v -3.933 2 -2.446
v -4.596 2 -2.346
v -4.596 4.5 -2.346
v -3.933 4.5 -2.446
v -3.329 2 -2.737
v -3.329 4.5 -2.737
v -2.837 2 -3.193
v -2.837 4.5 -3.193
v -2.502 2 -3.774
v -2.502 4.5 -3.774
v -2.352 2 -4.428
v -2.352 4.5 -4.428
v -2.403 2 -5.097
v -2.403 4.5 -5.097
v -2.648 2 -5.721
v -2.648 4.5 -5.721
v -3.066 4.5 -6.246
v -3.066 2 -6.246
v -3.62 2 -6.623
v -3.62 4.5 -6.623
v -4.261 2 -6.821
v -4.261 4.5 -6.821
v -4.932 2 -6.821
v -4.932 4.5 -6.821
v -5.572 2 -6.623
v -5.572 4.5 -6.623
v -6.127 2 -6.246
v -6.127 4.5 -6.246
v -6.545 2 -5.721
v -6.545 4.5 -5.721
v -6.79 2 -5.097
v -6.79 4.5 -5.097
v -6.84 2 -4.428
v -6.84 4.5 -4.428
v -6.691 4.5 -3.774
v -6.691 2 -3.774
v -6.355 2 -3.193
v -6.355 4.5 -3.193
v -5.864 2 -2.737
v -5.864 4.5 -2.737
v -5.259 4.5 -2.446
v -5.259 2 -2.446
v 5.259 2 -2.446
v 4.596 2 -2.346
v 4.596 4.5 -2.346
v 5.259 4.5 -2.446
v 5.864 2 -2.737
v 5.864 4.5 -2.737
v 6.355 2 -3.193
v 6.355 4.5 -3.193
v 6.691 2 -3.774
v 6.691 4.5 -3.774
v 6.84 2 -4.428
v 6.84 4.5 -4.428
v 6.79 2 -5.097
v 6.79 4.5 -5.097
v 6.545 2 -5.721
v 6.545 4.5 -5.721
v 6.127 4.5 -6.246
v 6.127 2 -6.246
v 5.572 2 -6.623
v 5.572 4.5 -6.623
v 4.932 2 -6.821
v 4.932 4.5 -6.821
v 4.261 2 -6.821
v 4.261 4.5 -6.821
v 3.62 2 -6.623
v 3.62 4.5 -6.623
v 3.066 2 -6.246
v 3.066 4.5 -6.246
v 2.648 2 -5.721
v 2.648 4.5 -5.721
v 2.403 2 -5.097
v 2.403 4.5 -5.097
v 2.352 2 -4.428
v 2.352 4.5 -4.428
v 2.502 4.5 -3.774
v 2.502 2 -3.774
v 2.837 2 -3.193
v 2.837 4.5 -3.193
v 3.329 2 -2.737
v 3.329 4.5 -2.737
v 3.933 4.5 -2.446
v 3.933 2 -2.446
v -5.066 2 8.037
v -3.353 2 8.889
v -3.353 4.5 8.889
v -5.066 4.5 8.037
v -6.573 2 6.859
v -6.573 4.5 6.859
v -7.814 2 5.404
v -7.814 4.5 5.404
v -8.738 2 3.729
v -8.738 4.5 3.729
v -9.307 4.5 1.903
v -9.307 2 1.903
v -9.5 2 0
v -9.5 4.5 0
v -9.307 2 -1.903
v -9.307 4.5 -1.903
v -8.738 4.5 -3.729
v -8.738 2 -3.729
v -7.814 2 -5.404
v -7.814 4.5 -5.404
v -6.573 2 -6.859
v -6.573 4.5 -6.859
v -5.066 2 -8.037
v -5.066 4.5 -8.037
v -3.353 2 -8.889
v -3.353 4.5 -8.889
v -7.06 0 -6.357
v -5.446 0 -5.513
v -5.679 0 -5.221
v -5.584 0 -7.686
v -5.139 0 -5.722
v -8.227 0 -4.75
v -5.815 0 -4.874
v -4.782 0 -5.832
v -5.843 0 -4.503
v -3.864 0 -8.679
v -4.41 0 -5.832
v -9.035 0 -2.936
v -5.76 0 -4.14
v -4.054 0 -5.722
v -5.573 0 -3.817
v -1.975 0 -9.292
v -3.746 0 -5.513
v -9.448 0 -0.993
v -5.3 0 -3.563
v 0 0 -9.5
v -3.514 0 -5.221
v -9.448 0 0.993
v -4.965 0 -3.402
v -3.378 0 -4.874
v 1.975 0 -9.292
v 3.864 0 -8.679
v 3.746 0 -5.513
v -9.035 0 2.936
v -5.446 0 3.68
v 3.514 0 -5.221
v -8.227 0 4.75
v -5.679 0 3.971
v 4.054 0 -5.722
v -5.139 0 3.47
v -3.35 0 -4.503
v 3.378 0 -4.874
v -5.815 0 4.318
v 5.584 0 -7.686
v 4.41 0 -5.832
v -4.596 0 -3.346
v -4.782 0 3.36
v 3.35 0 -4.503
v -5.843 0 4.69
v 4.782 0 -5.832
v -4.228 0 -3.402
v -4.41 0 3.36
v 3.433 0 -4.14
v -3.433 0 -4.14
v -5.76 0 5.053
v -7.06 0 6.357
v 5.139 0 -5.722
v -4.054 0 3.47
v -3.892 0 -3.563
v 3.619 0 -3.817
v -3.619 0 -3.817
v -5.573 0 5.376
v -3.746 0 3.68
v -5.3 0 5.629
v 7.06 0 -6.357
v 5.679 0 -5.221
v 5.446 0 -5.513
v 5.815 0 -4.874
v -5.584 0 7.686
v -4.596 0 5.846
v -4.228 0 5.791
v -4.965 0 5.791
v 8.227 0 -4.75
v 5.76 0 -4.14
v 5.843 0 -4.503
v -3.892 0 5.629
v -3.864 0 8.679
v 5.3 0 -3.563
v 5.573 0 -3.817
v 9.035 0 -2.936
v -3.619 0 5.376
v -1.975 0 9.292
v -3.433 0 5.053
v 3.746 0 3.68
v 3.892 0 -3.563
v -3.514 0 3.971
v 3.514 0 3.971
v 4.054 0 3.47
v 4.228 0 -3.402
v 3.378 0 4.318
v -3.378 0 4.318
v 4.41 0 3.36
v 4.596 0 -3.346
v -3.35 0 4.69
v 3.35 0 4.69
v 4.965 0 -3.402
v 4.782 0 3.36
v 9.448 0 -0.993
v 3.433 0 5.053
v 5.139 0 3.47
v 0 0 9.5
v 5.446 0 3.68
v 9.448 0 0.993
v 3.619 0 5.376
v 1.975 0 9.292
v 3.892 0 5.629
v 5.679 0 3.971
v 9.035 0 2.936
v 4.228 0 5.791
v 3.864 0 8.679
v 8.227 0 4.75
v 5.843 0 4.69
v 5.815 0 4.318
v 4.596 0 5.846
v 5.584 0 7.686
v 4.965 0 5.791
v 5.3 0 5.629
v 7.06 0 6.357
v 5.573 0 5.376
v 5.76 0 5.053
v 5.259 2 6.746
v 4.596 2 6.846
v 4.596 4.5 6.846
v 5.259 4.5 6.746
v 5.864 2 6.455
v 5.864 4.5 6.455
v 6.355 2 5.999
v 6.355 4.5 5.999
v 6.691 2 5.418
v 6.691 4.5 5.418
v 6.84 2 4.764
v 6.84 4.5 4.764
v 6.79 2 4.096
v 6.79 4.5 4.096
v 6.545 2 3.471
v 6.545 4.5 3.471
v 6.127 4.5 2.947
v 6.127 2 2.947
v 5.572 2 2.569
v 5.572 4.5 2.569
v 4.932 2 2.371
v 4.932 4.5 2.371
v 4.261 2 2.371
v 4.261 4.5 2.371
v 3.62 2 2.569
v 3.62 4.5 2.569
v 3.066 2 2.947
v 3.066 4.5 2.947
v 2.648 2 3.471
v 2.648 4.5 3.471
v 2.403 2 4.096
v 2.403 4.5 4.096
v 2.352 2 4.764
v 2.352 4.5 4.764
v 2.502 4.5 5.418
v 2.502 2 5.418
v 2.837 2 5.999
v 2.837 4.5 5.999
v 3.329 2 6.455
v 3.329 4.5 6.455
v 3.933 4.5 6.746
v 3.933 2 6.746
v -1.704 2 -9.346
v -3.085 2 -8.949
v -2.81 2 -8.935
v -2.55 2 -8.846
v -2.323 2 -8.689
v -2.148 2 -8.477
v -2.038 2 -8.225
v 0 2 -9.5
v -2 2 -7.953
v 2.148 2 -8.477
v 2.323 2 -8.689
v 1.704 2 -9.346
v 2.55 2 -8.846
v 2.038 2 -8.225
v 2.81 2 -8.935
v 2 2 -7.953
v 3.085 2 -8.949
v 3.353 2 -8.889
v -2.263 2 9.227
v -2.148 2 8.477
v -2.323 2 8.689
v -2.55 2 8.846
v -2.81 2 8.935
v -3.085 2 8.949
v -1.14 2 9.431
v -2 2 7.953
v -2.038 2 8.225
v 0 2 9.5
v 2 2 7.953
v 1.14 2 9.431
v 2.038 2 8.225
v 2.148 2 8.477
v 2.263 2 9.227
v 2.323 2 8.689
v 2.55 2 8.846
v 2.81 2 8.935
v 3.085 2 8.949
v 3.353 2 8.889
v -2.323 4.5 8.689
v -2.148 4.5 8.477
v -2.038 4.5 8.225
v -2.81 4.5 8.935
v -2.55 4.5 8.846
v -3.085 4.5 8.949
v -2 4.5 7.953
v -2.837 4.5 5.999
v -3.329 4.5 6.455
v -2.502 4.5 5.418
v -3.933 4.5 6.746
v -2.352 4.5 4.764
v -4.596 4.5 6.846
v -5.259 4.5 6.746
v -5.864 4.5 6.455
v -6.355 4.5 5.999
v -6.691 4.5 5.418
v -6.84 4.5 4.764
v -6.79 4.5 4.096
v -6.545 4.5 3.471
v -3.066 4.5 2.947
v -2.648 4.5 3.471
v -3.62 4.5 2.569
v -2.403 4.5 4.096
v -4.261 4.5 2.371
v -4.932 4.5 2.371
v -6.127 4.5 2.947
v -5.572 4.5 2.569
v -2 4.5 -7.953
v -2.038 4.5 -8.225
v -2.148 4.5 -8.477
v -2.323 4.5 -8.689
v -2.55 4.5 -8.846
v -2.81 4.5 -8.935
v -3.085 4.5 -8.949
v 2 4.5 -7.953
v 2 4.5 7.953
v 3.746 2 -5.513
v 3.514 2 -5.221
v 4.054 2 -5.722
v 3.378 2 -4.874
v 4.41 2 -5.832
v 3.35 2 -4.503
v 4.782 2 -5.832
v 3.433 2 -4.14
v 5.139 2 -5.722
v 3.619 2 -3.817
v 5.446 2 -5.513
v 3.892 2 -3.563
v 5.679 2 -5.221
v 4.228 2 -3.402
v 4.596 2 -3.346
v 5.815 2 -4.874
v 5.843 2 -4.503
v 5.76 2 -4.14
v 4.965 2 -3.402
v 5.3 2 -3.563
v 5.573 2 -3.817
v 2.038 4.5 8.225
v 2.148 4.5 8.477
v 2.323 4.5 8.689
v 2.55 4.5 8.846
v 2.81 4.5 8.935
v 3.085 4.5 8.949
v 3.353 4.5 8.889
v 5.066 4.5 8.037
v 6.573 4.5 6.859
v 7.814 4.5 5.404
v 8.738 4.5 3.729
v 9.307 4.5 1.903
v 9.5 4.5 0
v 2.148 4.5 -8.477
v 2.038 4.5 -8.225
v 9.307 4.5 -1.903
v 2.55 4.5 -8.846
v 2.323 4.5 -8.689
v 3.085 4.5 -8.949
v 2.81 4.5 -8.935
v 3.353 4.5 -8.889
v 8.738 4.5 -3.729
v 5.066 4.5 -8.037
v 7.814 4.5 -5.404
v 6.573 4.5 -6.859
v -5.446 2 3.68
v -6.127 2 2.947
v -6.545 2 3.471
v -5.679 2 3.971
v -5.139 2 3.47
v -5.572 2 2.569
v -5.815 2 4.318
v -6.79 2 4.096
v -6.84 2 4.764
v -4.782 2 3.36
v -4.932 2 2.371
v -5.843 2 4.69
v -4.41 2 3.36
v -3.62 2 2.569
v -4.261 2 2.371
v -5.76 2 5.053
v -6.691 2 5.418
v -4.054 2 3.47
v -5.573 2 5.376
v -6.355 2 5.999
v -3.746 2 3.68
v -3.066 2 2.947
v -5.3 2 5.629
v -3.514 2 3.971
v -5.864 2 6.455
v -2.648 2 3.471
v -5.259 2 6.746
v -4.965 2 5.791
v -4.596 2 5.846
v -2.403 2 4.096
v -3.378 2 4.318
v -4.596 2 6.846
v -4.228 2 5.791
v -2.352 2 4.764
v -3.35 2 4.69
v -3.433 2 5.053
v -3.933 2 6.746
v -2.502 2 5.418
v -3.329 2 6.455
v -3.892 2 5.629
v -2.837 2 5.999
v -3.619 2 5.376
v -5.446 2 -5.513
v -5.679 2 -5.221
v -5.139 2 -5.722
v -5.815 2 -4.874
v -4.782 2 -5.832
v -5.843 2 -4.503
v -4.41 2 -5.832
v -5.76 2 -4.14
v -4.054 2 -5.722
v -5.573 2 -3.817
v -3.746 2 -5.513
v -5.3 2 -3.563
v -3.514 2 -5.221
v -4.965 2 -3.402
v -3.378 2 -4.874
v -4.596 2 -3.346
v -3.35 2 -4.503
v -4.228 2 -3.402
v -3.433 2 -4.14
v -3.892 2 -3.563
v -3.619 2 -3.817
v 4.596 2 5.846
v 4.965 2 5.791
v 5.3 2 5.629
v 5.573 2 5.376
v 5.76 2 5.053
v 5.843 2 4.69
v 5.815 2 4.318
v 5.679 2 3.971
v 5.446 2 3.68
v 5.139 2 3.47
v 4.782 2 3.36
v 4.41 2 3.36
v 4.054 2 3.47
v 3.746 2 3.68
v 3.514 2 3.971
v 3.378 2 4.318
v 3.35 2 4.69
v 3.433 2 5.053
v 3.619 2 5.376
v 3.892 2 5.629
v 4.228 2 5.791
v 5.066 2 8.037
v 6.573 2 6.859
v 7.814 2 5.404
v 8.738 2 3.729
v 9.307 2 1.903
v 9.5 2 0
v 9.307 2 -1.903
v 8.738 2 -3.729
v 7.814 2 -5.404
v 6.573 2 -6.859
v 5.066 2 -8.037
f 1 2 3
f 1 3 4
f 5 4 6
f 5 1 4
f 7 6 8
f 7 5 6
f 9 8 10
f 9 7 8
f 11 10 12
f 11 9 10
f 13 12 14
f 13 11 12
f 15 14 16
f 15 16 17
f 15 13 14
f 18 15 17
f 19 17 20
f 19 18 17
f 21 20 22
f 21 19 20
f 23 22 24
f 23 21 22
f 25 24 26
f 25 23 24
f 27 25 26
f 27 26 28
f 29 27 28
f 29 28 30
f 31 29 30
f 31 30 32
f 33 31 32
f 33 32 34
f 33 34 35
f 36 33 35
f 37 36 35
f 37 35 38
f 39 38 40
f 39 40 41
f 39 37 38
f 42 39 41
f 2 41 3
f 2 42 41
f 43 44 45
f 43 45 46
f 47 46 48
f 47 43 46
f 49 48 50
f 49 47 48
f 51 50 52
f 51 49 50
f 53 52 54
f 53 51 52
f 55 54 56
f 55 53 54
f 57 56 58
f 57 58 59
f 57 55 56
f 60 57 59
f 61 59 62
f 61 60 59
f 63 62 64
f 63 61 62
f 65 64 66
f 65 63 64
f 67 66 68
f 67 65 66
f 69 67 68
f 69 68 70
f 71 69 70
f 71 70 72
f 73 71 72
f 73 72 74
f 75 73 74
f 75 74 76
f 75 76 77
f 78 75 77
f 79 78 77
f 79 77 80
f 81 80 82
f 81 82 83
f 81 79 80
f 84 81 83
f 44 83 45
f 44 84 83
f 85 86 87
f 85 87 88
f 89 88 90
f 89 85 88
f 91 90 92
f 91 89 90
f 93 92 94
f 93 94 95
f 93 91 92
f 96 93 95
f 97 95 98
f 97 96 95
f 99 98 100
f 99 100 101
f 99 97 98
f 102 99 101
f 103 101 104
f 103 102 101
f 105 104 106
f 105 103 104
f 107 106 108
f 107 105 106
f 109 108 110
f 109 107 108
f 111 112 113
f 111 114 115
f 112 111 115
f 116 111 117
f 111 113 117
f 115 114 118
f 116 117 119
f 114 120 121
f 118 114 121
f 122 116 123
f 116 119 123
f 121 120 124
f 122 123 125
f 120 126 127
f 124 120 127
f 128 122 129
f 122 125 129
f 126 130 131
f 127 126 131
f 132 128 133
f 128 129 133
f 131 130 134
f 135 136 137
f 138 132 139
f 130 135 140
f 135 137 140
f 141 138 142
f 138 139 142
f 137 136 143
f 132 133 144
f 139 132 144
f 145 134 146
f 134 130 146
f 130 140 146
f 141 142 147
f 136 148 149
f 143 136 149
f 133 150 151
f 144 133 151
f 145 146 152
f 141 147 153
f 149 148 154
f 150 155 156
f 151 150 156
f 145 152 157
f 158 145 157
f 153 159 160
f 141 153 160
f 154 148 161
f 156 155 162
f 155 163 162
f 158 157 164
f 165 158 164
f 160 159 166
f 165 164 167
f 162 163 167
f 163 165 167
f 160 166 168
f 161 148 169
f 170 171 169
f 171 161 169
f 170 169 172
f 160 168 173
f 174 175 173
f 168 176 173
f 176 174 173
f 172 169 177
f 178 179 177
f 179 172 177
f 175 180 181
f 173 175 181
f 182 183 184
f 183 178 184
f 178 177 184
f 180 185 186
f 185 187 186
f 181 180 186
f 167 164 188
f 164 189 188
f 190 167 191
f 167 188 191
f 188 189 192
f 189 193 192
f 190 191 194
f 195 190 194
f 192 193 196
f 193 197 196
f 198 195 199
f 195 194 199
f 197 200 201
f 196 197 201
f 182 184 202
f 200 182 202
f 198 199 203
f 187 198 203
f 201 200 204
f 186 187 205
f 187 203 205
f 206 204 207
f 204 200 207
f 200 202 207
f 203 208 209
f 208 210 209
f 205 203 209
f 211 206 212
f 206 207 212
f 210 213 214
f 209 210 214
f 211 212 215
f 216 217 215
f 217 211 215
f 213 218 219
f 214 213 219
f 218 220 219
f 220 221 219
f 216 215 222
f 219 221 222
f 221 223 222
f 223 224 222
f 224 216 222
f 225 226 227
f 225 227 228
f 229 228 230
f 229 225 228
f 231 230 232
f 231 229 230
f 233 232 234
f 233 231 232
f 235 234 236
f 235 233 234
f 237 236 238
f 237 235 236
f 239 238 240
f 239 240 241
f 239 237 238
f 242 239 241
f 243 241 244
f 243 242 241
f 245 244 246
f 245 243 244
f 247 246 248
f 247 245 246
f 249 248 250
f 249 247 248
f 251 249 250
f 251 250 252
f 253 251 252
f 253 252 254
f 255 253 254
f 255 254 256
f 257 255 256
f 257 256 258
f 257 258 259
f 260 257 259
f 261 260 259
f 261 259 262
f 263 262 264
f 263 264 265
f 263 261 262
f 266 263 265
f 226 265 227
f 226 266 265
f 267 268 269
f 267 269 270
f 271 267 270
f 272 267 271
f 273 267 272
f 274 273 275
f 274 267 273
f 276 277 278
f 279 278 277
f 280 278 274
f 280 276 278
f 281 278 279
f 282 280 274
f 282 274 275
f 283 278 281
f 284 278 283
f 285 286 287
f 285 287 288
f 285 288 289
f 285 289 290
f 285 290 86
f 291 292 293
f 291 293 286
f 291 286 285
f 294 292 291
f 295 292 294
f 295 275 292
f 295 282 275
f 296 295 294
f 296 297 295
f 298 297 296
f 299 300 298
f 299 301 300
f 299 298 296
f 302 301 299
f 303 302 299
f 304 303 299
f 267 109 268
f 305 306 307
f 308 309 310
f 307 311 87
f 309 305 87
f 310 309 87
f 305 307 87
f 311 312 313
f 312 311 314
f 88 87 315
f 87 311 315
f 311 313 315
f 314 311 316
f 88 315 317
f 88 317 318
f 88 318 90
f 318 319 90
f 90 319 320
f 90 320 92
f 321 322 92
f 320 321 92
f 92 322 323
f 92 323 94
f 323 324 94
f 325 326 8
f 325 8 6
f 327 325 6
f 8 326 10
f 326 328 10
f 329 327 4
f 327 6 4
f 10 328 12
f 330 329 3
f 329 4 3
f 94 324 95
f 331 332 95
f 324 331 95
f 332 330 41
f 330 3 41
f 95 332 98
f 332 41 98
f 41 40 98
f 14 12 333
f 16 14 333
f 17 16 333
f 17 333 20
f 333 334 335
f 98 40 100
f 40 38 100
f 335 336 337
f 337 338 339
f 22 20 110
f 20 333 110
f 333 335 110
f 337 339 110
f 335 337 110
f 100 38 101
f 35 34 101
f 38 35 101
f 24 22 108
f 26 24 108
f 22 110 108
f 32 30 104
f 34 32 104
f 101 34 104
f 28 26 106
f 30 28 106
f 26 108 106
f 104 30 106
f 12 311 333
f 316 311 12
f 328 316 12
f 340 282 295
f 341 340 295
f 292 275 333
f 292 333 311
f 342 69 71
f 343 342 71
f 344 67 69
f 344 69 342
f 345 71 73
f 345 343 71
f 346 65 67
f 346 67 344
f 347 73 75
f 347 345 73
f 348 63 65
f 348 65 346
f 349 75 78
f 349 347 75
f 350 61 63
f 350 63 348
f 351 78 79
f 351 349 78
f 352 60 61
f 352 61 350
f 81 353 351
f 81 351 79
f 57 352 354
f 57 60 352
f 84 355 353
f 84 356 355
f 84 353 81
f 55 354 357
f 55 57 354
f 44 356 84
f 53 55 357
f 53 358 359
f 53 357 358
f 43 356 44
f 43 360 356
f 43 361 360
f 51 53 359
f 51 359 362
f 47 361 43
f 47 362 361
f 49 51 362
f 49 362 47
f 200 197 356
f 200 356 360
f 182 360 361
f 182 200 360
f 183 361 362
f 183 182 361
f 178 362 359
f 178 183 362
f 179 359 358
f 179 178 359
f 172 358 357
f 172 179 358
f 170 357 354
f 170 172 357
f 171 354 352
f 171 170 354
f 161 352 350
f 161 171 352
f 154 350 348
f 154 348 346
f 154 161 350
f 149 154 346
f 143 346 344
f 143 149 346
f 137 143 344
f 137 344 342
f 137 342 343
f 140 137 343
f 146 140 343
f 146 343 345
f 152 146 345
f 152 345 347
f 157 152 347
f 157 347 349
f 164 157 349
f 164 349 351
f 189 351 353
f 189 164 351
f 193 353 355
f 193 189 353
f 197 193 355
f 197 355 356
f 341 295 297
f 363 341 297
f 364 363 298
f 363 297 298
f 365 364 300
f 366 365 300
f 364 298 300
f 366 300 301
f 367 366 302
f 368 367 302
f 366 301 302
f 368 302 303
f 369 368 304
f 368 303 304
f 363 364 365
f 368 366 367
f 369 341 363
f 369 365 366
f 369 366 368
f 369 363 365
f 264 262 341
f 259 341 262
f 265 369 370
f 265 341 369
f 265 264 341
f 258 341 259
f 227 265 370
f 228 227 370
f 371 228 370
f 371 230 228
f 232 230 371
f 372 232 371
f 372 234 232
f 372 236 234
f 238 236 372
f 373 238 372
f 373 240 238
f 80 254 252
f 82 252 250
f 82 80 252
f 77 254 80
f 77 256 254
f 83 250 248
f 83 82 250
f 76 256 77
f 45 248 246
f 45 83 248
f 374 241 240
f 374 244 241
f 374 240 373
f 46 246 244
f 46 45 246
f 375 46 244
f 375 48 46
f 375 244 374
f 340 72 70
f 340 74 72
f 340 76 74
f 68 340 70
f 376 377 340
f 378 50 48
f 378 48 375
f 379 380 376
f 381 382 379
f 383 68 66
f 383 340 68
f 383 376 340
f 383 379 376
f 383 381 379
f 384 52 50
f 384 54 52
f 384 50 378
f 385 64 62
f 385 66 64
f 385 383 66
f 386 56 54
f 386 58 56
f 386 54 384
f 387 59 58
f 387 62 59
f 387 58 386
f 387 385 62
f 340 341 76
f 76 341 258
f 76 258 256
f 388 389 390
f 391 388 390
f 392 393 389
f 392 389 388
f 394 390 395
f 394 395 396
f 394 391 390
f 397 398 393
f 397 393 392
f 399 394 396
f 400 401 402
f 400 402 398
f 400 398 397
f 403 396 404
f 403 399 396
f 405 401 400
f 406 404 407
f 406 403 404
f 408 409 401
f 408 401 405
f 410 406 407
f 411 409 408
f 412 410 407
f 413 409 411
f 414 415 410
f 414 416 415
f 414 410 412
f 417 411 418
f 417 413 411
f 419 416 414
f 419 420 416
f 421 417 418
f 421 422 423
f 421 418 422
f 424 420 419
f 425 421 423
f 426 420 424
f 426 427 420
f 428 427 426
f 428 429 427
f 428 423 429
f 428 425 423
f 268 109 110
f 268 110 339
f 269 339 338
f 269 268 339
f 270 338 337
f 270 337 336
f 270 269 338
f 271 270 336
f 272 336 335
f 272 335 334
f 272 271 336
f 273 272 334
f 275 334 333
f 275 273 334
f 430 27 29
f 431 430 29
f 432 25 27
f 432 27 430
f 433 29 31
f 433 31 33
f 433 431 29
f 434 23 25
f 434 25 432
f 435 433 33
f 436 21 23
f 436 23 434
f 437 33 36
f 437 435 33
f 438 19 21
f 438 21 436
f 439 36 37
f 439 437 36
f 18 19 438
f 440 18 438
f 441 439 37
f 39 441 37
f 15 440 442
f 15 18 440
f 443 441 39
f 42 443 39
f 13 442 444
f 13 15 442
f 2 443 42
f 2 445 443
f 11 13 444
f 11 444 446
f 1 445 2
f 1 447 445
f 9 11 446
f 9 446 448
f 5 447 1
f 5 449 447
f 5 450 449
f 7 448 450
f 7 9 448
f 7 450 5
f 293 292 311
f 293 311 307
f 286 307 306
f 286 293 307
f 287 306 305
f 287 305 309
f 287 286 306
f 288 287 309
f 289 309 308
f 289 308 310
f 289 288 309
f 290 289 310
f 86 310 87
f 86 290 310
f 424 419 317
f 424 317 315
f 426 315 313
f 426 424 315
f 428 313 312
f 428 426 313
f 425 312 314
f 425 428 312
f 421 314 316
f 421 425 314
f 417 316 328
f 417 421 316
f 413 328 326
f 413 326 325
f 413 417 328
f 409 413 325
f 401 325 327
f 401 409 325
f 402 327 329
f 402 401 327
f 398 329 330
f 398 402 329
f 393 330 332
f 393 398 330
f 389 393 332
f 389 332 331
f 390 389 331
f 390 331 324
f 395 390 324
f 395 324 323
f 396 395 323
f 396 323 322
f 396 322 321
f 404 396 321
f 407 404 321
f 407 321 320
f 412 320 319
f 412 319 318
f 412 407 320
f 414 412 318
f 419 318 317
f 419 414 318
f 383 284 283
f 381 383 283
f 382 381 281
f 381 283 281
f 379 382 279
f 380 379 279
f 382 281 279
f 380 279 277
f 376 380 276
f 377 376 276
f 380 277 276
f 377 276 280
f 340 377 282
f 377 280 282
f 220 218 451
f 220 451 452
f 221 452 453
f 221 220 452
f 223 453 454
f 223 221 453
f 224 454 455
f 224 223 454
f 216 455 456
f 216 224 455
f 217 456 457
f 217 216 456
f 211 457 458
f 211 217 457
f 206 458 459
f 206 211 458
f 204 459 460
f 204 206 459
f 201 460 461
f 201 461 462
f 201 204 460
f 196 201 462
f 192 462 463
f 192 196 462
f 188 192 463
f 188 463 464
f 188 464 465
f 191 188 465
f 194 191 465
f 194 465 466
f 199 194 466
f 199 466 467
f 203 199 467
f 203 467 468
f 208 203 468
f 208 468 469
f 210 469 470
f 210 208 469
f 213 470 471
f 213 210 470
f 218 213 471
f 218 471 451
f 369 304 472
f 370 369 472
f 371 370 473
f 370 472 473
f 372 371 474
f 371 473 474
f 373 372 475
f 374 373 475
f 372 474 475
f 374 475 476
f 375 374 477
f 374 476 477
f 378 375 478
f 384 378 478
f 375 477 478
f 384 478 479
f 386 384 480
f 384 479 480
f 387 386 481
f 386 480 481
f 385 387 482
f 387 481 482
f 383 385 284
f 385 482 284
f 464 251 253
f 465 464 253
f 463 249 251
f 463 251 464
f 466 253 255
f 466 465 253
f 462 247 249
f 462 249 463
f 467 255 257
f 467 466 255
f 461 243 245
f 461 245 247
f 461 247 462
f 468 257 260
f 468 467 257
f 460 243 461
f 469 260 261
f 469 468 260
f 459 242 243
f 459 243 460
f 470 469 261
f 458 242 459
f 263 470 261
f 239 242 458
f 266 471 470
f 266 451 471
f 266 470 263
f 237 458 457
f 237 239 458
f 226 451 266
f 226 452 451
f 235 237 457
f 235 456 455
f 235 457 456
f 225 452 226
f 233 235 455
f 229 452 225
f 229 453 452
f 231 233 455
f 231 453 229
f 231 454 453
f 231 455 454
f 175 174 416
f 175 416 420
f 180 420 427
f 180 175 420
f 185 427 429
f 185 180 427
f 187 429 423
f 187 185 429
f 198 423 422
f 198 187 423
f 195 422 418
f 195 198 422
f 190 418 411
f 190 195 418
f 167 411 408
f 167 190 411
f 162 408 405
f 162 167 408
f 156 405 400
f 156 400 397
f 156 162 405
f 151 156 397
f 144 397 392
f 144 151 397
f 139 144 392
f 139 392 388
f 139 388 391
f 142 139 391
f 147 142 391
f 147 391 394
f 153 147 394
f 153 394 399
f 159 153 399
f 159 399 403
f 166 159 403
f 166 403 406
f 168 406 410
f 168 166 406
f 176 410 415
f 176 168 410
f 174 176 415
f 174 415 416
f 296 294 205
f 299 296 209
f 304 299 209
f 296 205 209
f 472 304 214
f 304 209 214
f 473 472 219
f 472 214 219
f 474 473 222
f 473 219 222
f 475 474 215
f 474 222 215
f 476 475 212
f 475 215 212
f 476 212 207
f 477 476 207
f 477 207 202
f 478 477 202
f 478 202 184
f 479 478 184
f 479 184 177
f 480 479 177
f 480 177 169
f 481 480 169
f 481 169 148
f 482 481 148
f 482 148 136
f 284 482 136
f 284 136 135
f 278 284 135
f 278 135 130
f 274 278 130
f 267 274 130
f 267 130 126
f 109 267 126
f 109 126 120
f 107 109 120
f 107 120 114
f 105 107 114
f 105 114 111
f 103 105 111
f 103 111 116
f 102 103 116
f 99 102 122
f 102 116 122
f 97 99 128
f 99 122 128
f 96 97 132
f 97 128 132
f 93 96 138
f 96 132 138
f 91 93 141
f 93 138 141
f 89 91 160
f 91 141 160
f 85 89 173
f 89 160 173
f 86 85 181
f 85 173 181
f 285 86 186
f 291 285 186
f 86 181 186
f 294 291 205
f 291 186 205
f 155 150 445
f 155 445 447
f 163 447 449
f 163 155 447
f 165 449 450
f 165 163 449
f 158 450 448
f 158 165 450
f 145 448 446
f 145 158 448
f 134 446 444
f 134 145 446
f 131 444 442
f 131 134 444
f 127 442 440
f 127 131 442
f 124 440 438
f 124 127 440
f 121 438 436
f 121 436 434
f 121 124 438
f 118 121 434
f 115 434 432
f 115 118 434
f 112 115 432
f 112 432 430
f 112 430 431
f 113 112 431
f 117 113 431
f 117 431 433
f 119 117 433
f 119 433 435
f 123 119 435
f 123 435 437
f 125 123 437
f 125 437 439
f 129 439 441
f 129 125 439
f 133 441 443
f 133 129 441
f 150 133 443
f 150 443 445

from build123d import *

# Parameters (mm, degrees)
SKETCH_1_R      = 9.5
SKETCH_1_R_2    = 1.25
EXTRUDE_1_DEPTH = 2
SKETCH_2_R      = 2.25
EXTRUDE_2_DEPTH = 2.5


with BuildPart() as part:
    # 草图1 → 凸台-拉伸1 (new body)
    with BuildSketch(Plane(origin=(0, 0, 0), x_dir=(1, 0, 0), z_dir=(0, 1, 0))):
        with Locations(Location((0, 0, 0), (0, 0, 270))):
            Circle(SKETCH_1_R)
        with Locations(Location((4.596194078, 4.596194078, 0), (0, 0, 270))):
            Circle(SKETCH_1_R_2, mode=Mode.SUBTRACT)
        with Locations(Location((4.596194078, -4.596194078, 0), (0, 0, 270))):
            Circle(SKETCH_1_R_2, mode=Mode.SUBTRACT)
        with Locations(Location((-4.596194078, -4.596194078, 0), (0, 0, 270))):
            Circle(SKETCH_1_R_2, mode=Mode.SUBTRACT)
        with Locations(Location((-4.596194078, 4.596194078, 0), (0, 0, 270))):
            Circle(SKETCH_1_R_2, mode=Mode.SUBTRACT)
    extrude(amount=EXTRUDE_1_DEPTH)

    # 草图2 → 凸台-拉伸2 (add)
    # profile 1 of 2: a face of its own
    with BuildSketch(Plane(origin=(0, 2, 0), x_dir=(1, 0, 0), z_dir=(0, 1, 0))):
        with BuildLine():
            Line((-2, 7.95298686), (-2, -7.95298686))
            ThreePointArc((-2, -7.95298686), (-2.431203541, -8.775465181), (-3.352941176, -8.888632373))
            ThreePointArc((-3.352941176, -8.888632373), (-9.5, 0), (-3.352941176, 8.888632373))
            ThreePointArc((-3.352941176, 8.888632373), (-2.431203541, 8.775465181), (-2, 7.95298686))
        make_face()
        with Locations(Location((-4.596194078, 4.596194078, 0), (0, 0, 270))):
            Circle(SKETCH_2_R, mode=Mode.SUBTRACT)
        with Locations(Location((-4.596194078, -4.596194078, 0), (0, 0, 270))):
            Circle(SKETCH_2_R, mode=Mode.SUBTRACT)
    # profile 2 of 2: a face of its own
    with BuildSketch(Plane(origin=(0, 2, 0), x_dir=(1, 0, 0), z_dir=(0, 1, 0))):
        with BuildLine():
            Line((2, 7.95298686), (2, -7.95298686))
            ThreePointArc((2, -7.95298686), (2.431203541, -8.775465181), (3.352941176, -8.888632373))
            ThreePointArc((3.352941176, -8.888632373), (9.5, 0), (3.352941176, 8.888632373))
            ThreePointArc((3.352941176, 8.888632373), (2.431203541, 8.775465181), (2, 7.95298686))
        make_face()
        with Locations(Location((4.596194078, 4.596194078, 0), (0, 0, 270))):
            Circle(SKETCH_2_R, mode=Mode.SUBTRACT)
        with Locations(Location((4.596194078, -4.596194078, 0), (0, 0, 270))):
            Circle(SKETCH_2_R, mode=Mode.SUBTRACT)
    extrude(amount=EXTRUDE_2_DEPTH)


solid = part.part
